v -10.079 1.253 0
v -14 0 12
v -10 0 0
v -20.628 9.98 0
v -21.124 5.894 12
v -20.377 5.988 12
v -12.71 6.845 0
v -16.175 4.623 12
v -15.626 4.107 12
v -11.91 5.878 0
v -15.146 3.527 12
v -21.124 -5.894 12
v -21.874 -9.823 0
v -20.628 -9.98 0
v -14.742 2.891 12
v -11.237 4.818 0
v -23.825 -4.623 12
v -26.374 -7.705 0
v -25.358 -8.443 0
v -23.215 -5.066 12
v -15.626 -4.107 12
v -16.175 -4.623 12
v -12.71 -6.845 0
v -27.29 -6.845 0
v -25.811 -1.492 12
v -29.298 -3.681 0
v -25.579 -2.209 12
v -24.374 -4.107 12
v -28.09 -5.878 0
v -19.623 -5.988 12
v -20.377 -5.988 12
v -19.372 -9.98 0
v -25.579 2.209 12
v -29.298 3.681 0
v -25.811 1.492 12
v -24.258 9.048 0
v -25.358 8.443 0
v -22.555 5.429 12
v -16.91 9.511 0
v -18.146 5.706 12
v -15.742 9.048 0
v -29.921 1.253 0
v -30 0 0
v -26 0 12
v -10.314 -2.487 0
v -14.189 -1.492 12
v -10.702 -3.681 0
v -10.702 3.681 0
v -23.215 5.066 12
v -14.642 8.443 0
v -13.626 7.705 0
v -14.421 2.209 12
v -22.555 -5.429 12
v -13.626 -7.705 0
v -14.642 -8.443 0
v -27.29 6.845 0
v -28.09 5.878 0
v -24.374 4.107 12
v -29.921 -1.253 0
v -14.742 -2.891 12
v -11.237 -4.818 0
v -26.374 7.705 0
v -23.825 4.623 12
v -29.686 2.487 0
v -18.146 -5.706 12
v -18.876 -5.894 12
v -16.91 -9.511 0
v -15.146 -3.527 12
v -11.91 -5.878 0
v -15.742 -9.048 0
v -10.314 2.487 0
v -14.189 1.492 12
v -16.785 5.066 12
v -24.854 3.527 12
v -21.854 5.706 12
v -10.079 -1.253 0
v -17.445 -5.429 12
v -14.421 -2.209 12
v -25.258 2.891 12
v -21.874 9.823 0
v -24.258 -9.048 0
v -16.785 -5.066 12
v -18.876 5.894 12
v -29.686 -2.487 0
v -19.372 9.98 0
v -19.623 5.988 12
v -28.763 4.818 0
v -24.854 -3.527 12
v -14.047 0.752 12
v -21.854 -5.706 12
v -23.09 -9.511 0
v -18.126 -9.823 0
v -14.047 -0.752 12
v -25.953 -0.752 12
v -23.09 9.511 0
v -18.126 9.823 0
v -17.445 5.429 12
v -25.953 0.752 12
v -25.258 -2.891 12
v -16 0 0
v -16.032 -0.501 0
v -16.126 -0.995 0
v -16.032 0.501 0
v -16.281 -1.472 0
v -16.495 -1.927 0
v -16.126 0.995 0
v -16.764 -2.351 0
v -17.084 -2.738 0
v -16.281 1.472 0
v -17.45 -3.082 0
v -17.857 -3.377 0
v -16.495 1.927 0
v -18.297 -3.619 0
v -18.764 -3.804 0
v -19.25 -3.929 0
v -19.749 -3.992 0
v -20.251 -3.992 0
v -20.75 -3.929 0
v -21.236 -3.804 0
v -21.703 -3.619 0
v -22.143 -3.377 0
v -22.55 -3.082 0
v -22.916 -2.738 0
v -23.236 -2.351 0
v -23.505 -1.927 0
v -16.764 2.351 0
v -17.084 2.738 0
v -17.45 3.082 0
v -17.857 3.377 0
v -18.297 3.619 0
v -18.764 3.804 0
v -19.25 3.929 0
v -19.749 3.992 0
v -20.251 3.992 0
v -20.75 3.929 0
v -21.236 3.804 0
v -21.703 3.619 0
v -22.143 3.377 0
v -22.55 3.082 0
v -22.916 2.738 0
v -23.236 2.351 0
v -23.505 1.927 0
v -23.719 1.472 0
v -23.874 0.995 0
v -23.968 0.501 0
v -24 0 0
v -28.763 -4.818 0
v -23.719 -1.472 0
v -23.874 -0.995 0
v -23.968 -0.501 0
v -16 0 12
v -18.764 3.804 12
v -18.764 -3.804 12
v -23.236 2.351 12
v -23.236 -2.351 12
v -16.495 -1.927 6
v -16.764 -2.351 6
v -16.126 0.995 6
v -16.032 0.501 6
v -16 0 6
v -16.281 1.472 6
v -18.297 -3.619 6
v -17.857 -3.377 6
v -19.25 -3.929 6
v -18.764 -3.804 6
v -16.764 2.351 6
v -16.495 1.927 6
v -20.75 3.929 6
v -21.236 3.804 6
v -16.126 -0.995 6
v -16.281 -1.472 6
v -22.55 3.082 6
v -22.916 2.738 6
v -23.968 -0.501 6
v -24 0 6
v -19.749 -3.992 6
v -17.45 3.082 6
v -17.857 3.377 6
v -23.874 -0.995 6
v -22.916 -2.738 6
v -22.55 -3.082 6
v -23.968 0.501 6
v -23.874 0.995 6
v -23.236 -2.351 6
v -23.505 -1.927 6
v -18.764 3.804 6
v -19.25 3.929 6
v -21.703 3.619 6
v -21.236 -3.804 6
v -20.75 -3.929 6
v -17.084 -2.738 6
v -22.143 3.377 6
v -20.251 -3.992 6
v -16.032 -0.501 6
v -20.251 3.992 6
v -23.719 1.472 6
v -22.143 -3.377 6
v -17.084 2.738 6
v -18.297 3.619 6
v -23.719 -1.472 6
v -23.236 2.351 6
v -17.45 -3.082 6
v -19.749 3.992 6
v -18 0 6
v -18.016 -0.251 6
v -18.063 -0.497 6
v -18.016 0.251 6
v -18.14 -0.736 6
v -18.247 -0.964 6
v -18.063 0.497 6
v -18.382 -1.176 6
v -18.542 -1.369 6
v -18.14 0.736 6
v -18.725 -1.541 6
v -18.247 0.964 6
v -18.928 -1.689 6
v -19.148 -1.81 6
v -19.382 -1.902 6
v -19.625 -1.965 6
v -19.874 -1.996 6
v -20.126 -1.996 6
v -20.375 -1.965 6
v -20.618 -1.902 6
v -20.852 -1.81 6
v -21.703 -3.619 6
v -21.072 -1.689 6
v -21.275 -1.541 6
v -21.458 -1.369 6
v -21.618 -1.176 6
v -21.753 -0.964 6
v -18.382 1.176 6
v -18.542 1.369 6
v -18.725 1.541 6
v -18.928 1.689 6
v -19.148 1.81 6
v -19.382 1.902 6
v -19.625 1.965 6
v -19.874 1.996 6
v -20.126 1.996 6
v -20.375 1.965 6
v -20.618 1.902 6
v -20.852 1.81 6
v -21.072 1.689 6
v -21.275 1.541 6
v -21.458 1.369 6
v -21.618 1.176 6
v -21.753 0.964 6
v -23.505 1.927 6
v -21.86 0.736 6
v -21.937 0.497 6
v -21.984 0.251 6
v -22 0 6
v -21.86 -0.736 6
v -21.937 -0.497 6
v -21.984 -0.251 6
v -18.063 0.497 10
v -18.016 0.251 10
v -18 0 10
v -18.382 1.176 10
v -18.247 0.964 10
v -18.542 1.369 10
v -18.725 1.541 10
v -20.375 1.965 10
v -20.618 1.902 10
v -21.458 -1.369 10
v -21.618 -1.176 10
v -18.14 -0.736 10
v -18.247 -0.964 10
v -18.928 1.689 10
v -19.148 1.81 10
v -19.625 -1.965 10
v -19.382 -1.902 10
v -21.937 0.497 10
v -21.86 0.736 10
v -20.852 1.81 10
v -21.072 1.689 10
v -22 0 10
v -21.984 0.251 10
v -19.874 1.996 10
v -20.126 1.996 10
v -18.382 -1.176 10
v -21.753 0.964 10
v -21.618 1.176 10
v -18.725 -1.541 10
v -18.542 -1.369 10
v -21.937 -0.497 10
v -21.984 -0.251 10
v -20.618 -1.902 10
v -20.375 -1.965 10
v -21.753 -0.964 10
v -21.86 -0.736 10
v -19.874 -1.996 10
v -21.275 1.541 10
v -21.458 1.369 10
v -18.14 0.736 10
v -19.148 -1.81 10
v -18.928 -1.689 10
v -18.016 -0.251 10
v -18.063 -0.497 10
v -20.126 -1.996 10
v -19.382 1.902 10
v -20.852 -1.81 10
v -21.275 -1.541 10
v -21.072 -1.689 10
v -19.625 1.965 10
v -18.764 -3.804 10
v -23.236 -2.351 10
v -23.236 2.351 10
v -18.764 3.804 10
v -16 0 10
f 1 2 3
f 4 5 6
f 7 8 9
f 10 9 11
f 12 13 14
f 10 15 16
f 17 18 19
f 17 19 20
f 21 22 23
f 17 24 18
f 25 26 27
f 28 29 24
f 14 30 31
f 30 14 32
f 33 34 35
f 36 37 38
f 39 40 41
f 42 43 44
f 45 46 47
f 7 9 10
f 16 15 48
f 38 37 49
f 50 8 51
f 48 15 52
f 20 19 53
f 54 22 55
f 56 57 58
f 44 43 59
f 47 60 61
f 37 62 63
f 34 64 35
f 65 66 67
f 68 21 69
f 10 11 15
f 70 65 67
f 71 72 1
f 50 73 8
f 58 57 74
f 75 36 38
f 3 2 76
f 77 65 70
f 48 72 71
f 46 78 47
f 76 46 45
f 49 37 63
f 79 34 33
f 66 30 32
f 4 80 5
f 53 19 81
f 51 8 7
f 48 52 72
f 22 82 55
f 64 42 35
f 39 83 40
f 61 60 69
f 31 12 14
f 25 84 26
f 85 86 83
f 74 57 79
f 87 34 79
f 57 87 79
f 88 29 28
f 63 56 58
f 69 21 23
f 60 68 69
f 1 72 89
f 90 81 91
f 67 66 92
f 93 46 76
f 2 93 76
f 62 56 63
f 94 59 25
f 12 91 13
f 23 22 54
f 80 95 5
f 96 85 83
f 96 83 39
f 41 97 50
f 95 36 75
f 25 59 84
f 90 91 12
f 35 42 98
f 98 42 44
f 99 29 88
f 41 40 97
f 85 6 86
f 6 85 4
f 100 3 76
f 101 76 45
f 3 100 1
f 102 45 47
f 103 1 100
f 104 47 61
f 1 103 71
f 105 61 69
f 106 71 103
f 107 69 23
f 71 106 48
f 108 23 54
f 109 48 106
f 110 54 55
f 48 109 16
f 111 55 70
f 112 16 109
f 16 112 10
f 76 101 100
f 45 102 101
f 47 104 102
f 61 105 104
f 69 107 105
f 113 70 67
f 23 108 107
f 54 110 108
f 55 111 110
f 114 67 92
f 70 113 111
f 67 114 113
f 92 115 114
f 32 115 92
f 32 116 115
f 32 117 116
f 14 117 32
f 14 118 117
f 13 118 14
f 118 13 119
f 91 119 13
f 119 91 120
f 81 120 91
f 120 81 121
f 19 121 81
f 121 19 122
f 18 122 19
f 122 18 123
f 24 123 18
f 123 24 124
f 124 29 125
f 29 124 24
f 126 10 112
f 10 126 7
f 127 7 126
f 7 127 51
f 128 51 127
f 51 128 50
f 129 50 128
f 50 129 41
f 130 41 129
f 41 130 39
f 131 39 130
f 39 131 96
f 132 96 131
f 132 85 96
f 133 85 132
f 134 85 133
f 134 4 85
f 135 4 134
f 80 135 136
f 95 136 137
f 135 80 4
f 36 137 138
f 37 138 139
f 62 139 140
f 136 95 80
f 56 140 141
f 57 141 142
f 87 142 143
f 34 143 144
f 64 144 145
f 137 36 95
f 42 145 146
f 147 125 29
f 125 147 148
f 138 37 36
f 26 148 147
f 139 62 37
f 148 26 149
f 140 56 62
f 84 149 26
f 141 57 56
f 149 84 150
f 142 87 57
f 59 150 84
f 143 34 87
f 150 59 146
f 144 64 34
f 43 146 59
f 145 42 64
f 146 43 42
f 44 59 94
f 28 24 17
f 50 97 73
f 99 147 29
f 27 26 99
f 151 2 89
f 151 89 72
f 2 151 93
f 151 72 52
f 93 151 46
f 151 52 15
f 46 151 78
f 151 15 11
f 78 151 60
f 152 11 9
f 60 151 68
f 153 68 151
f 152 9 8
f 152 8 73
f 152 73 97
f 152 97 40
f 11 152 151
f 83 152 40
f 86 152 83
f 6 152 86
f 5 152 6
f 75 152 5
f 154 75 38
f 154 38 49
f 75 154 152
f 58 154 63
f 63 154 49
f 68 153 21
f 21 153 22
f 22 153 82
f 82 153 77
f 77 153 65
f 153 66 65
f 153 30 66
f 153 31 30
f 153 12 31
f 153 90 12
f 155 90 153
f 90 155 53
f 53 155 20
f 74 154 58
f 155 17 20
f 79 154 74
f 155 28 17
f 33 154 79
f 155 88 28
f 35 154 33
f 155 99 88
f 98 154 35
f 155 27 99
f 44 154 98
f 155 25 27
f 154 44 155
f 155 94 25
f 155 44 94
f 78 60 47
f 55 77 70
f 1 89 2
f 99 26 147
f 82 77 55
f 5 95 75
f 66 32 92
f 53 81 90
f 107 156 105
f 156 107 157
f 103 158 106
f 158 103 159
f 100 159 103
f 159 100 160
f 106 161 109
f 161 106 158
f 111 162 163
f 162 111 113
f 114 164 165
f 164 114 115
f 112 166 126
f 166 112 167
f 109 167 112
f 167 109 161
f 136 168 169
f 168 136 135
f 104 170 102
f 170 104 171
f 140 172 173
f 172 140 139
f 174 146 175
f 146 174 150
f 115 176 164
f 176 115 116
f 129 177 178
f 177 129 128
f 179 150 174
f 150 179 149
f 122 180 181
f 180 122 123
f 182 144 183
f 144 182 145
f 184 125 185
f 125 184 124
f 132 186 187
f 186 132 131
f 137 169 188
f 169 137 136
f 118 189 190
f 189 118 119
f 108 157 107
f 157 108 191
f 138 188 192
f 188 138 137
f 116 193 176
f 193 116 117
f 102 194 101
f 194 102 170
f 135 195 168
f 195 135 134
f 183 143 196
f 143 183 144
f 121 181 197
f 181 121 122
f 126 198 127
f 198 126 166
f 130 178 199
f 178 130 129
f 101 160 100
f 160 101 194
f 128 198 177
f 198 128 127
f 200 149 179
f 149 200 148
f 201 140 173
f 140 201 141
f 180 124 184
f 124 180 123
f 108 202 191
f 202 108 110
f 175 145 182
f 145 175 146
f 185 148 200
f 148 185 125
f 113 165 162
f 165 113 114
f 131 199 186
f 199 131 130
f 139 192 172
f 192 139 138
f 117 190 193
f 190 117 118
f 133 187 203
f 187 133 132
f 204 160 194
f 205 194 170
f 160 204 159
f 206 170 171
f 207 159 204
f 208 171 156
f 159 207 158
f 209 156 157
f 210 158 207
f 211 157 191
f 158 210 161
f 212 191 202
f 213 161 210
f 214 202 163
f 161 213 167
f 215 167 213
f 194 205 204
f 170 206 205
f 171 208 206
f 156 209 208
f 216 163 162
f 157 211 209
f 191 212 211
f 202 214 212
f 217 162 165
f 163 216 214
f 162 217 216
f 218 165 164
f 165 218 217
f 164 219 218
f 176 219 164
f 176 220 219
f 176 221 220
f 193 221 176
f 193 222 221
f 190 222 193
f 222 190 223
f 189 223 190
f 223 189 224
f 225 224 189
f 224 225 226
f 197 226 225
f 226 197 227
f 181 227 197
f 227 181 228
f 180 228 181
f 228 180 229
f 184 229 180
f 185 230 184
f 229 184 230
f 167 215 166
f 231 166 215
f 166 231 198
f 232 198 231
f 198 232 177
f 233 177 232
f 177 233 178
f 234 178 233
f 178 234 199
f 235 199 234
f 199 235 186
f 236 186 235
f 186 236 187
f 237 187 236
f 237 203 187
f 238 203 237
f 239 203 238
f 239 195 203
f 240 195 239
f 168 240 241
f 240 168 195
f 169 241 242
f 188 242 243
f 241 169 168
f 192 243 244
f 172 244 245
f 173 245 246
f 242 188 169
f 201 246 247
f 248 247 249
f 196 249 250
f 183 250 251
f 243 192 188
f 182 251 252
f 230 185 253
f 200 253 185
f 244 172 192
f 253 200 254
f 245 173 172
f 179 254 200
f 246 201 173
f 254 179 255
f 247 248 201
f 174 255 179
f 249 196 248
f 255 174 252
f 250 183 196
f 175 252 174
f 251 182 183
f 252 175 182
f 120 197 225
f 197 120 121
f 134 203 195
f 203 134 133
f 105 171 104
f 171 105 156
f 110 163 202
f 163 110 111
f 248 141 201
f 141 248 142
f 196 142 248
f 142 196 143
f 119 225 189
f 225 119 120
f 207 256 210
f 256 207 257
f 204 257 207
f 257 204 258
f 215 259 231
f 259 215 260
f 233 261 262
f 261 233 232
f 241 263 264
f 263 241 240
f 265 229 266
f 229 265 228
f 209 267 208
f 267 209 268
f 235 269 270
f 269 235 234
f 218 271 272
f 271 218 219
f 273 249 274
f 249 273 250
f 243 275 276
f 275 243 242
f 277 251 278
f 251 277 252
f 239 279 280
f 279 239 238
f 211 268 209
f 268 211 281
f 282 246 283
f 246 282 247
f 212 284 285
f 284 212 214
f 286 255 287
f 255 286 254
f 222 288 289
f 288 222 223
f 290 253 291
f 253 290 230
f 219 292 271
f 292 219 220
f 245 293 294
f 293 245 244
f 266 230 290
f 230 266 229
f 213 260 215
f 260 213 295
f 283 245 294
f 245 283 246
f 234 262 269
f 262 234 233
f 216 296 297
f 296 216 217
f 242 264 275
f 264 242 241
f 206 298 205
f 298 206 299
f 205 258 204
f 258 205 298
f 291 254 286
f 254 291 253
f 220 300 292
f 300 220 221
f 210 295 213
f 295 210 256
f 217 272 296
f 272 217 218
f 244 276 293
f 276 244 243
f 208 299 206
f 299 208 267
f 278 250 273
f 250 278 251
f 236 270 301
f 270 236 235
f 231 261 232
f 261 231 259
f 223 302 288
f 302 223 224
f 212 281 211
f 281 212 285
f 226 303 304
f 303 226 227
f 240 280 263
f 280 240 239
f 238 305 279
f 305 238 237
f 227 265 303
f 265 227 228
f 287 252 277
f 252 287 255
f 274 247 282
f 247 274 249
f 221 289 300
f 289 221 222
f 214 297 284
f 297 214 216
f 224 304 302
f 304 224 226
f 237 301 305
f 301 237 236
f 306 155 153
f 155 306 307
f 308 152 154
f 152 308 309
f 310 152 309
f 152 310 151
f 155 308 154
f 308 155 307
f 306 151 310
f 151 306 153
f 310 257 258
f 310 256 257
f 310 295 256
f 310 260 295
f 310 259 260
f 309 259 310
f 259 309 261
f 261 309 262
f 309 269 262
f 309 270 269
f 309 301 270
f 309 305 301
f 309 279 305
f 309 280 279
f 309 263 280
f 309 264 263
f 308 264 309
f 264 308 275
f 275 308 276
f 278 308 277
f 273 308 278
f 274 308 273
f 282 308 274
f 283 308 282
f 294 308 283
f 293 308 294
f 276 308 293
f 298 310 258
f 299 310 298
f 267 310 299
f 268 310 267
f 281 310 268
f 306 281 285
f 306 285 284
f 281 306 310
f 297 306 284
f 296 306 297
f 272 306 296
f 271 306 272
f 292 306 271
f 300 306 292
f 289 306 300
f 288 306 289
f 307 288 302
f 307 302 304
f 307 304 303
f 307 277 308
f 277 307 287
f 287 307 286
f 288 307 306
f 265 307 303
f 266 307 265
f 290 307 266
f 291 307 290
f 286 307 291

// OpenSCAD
/*
    Level Foot for 2020 aluminium frame
*/

// Select the part to render, 1 = foot holder, 2 = foot, -1 = All
draw = 2;

Width = 3;
HolderLength = 40;
FrameHeight = 20;
screw = 4;

lowHolderLength = 20;
lowHolderWidth = 15;
lowHolderHeight = 6;

nut = 8;
nutHeight = 2;

footBottomDiam = 20;
footTopDiam = 12;
footHeight = 12;

footScrewShaft = 6;
lowerShaftguard = 4;

$fn = 50;

// Render the foot holder
if(draw == 1 || draw == -1)
{
    union() {    
        difference() {
            cube([HolderLength, FrameHeight, Width]);
            
            translate([HolderLength / 8, FrameHeight / 2, 0]) cylinder(d = screw, h = Width);
            translate([(HolderLength / 8) * 7, FrameHeight / 2, 0]) cylinder(d = screw, h = Width);
        }
        
        translate([(HolderLength / 2) - (lowHolderLength / 2), lowHolderHeight, Width]) 
        {
            rotate([90, 0, 0])     
                difference() {    
                    cube([lowHolderLength, lowHolderWidth, lowHolderHeight]); 
                                       
                    translate([lowHolderLength / 2, lowHolderWidth / 2, 0]) cylinder(d = screw, h = lowHolderHeight);
                    
                    translate([lowHolderLength / 2, lowHolderWidth / 2, -1 * lowHolderHeight + nutHeight]) cylinder(d = nut, h = lowHolderHeight, $fn = 5);
                    
                    translate([lowHolderLength / 2, lowHolderWidth / 2, lowHolderHeight - nutHeight]) cylinder(d = nut, h = lowHolderHeight, $fn = 5);
                }               
                
            translate([Width, -1, -1])
                support();
                
            translate([lowHolderLength, -1, -1])
                support();
        }
    }
}

module support() {
    rotate([0, -90, 0]) 
        difference() {
            cube([lowHolderLength - lowHolderHeight, FrameHeight - lowHolderHeight, Width]);
            translate([lowHolderLength - lowHolderHeight, lowHolderLength - lowHolderHeight, 0]) cylinder(r = lowHolderLength - lowHolderHeight - 1, h = lowHolderHeight);
        }    
}

// render the foot
if(draw == 2 || draw == -1) 
{
    translate([-20, 0, footHeight / 2]) {
        union() {
            difference() {
                cylinder(d1 = footBottomDiam, d2 = footTopDiam, h = footHeight, center = true);

                translate([0, 0, -footScrewShaft / 2]) 
                    cylinder(d = screw + lowerShaftguard, h = footHeight - footScrewShaft, center = true);

                translate([0, 0, footHeight / 2 - footScrewShaft / 2]) 
                    cylinder(d = screw, h = footScrewShaft, center = true);

                translate([0, 0, footHeight / 2 - nutHeight / 2]) 
                    cylinder(d = nut, h = nutHeight, $fn = 5, center = true);
            }
        }
    }
}
